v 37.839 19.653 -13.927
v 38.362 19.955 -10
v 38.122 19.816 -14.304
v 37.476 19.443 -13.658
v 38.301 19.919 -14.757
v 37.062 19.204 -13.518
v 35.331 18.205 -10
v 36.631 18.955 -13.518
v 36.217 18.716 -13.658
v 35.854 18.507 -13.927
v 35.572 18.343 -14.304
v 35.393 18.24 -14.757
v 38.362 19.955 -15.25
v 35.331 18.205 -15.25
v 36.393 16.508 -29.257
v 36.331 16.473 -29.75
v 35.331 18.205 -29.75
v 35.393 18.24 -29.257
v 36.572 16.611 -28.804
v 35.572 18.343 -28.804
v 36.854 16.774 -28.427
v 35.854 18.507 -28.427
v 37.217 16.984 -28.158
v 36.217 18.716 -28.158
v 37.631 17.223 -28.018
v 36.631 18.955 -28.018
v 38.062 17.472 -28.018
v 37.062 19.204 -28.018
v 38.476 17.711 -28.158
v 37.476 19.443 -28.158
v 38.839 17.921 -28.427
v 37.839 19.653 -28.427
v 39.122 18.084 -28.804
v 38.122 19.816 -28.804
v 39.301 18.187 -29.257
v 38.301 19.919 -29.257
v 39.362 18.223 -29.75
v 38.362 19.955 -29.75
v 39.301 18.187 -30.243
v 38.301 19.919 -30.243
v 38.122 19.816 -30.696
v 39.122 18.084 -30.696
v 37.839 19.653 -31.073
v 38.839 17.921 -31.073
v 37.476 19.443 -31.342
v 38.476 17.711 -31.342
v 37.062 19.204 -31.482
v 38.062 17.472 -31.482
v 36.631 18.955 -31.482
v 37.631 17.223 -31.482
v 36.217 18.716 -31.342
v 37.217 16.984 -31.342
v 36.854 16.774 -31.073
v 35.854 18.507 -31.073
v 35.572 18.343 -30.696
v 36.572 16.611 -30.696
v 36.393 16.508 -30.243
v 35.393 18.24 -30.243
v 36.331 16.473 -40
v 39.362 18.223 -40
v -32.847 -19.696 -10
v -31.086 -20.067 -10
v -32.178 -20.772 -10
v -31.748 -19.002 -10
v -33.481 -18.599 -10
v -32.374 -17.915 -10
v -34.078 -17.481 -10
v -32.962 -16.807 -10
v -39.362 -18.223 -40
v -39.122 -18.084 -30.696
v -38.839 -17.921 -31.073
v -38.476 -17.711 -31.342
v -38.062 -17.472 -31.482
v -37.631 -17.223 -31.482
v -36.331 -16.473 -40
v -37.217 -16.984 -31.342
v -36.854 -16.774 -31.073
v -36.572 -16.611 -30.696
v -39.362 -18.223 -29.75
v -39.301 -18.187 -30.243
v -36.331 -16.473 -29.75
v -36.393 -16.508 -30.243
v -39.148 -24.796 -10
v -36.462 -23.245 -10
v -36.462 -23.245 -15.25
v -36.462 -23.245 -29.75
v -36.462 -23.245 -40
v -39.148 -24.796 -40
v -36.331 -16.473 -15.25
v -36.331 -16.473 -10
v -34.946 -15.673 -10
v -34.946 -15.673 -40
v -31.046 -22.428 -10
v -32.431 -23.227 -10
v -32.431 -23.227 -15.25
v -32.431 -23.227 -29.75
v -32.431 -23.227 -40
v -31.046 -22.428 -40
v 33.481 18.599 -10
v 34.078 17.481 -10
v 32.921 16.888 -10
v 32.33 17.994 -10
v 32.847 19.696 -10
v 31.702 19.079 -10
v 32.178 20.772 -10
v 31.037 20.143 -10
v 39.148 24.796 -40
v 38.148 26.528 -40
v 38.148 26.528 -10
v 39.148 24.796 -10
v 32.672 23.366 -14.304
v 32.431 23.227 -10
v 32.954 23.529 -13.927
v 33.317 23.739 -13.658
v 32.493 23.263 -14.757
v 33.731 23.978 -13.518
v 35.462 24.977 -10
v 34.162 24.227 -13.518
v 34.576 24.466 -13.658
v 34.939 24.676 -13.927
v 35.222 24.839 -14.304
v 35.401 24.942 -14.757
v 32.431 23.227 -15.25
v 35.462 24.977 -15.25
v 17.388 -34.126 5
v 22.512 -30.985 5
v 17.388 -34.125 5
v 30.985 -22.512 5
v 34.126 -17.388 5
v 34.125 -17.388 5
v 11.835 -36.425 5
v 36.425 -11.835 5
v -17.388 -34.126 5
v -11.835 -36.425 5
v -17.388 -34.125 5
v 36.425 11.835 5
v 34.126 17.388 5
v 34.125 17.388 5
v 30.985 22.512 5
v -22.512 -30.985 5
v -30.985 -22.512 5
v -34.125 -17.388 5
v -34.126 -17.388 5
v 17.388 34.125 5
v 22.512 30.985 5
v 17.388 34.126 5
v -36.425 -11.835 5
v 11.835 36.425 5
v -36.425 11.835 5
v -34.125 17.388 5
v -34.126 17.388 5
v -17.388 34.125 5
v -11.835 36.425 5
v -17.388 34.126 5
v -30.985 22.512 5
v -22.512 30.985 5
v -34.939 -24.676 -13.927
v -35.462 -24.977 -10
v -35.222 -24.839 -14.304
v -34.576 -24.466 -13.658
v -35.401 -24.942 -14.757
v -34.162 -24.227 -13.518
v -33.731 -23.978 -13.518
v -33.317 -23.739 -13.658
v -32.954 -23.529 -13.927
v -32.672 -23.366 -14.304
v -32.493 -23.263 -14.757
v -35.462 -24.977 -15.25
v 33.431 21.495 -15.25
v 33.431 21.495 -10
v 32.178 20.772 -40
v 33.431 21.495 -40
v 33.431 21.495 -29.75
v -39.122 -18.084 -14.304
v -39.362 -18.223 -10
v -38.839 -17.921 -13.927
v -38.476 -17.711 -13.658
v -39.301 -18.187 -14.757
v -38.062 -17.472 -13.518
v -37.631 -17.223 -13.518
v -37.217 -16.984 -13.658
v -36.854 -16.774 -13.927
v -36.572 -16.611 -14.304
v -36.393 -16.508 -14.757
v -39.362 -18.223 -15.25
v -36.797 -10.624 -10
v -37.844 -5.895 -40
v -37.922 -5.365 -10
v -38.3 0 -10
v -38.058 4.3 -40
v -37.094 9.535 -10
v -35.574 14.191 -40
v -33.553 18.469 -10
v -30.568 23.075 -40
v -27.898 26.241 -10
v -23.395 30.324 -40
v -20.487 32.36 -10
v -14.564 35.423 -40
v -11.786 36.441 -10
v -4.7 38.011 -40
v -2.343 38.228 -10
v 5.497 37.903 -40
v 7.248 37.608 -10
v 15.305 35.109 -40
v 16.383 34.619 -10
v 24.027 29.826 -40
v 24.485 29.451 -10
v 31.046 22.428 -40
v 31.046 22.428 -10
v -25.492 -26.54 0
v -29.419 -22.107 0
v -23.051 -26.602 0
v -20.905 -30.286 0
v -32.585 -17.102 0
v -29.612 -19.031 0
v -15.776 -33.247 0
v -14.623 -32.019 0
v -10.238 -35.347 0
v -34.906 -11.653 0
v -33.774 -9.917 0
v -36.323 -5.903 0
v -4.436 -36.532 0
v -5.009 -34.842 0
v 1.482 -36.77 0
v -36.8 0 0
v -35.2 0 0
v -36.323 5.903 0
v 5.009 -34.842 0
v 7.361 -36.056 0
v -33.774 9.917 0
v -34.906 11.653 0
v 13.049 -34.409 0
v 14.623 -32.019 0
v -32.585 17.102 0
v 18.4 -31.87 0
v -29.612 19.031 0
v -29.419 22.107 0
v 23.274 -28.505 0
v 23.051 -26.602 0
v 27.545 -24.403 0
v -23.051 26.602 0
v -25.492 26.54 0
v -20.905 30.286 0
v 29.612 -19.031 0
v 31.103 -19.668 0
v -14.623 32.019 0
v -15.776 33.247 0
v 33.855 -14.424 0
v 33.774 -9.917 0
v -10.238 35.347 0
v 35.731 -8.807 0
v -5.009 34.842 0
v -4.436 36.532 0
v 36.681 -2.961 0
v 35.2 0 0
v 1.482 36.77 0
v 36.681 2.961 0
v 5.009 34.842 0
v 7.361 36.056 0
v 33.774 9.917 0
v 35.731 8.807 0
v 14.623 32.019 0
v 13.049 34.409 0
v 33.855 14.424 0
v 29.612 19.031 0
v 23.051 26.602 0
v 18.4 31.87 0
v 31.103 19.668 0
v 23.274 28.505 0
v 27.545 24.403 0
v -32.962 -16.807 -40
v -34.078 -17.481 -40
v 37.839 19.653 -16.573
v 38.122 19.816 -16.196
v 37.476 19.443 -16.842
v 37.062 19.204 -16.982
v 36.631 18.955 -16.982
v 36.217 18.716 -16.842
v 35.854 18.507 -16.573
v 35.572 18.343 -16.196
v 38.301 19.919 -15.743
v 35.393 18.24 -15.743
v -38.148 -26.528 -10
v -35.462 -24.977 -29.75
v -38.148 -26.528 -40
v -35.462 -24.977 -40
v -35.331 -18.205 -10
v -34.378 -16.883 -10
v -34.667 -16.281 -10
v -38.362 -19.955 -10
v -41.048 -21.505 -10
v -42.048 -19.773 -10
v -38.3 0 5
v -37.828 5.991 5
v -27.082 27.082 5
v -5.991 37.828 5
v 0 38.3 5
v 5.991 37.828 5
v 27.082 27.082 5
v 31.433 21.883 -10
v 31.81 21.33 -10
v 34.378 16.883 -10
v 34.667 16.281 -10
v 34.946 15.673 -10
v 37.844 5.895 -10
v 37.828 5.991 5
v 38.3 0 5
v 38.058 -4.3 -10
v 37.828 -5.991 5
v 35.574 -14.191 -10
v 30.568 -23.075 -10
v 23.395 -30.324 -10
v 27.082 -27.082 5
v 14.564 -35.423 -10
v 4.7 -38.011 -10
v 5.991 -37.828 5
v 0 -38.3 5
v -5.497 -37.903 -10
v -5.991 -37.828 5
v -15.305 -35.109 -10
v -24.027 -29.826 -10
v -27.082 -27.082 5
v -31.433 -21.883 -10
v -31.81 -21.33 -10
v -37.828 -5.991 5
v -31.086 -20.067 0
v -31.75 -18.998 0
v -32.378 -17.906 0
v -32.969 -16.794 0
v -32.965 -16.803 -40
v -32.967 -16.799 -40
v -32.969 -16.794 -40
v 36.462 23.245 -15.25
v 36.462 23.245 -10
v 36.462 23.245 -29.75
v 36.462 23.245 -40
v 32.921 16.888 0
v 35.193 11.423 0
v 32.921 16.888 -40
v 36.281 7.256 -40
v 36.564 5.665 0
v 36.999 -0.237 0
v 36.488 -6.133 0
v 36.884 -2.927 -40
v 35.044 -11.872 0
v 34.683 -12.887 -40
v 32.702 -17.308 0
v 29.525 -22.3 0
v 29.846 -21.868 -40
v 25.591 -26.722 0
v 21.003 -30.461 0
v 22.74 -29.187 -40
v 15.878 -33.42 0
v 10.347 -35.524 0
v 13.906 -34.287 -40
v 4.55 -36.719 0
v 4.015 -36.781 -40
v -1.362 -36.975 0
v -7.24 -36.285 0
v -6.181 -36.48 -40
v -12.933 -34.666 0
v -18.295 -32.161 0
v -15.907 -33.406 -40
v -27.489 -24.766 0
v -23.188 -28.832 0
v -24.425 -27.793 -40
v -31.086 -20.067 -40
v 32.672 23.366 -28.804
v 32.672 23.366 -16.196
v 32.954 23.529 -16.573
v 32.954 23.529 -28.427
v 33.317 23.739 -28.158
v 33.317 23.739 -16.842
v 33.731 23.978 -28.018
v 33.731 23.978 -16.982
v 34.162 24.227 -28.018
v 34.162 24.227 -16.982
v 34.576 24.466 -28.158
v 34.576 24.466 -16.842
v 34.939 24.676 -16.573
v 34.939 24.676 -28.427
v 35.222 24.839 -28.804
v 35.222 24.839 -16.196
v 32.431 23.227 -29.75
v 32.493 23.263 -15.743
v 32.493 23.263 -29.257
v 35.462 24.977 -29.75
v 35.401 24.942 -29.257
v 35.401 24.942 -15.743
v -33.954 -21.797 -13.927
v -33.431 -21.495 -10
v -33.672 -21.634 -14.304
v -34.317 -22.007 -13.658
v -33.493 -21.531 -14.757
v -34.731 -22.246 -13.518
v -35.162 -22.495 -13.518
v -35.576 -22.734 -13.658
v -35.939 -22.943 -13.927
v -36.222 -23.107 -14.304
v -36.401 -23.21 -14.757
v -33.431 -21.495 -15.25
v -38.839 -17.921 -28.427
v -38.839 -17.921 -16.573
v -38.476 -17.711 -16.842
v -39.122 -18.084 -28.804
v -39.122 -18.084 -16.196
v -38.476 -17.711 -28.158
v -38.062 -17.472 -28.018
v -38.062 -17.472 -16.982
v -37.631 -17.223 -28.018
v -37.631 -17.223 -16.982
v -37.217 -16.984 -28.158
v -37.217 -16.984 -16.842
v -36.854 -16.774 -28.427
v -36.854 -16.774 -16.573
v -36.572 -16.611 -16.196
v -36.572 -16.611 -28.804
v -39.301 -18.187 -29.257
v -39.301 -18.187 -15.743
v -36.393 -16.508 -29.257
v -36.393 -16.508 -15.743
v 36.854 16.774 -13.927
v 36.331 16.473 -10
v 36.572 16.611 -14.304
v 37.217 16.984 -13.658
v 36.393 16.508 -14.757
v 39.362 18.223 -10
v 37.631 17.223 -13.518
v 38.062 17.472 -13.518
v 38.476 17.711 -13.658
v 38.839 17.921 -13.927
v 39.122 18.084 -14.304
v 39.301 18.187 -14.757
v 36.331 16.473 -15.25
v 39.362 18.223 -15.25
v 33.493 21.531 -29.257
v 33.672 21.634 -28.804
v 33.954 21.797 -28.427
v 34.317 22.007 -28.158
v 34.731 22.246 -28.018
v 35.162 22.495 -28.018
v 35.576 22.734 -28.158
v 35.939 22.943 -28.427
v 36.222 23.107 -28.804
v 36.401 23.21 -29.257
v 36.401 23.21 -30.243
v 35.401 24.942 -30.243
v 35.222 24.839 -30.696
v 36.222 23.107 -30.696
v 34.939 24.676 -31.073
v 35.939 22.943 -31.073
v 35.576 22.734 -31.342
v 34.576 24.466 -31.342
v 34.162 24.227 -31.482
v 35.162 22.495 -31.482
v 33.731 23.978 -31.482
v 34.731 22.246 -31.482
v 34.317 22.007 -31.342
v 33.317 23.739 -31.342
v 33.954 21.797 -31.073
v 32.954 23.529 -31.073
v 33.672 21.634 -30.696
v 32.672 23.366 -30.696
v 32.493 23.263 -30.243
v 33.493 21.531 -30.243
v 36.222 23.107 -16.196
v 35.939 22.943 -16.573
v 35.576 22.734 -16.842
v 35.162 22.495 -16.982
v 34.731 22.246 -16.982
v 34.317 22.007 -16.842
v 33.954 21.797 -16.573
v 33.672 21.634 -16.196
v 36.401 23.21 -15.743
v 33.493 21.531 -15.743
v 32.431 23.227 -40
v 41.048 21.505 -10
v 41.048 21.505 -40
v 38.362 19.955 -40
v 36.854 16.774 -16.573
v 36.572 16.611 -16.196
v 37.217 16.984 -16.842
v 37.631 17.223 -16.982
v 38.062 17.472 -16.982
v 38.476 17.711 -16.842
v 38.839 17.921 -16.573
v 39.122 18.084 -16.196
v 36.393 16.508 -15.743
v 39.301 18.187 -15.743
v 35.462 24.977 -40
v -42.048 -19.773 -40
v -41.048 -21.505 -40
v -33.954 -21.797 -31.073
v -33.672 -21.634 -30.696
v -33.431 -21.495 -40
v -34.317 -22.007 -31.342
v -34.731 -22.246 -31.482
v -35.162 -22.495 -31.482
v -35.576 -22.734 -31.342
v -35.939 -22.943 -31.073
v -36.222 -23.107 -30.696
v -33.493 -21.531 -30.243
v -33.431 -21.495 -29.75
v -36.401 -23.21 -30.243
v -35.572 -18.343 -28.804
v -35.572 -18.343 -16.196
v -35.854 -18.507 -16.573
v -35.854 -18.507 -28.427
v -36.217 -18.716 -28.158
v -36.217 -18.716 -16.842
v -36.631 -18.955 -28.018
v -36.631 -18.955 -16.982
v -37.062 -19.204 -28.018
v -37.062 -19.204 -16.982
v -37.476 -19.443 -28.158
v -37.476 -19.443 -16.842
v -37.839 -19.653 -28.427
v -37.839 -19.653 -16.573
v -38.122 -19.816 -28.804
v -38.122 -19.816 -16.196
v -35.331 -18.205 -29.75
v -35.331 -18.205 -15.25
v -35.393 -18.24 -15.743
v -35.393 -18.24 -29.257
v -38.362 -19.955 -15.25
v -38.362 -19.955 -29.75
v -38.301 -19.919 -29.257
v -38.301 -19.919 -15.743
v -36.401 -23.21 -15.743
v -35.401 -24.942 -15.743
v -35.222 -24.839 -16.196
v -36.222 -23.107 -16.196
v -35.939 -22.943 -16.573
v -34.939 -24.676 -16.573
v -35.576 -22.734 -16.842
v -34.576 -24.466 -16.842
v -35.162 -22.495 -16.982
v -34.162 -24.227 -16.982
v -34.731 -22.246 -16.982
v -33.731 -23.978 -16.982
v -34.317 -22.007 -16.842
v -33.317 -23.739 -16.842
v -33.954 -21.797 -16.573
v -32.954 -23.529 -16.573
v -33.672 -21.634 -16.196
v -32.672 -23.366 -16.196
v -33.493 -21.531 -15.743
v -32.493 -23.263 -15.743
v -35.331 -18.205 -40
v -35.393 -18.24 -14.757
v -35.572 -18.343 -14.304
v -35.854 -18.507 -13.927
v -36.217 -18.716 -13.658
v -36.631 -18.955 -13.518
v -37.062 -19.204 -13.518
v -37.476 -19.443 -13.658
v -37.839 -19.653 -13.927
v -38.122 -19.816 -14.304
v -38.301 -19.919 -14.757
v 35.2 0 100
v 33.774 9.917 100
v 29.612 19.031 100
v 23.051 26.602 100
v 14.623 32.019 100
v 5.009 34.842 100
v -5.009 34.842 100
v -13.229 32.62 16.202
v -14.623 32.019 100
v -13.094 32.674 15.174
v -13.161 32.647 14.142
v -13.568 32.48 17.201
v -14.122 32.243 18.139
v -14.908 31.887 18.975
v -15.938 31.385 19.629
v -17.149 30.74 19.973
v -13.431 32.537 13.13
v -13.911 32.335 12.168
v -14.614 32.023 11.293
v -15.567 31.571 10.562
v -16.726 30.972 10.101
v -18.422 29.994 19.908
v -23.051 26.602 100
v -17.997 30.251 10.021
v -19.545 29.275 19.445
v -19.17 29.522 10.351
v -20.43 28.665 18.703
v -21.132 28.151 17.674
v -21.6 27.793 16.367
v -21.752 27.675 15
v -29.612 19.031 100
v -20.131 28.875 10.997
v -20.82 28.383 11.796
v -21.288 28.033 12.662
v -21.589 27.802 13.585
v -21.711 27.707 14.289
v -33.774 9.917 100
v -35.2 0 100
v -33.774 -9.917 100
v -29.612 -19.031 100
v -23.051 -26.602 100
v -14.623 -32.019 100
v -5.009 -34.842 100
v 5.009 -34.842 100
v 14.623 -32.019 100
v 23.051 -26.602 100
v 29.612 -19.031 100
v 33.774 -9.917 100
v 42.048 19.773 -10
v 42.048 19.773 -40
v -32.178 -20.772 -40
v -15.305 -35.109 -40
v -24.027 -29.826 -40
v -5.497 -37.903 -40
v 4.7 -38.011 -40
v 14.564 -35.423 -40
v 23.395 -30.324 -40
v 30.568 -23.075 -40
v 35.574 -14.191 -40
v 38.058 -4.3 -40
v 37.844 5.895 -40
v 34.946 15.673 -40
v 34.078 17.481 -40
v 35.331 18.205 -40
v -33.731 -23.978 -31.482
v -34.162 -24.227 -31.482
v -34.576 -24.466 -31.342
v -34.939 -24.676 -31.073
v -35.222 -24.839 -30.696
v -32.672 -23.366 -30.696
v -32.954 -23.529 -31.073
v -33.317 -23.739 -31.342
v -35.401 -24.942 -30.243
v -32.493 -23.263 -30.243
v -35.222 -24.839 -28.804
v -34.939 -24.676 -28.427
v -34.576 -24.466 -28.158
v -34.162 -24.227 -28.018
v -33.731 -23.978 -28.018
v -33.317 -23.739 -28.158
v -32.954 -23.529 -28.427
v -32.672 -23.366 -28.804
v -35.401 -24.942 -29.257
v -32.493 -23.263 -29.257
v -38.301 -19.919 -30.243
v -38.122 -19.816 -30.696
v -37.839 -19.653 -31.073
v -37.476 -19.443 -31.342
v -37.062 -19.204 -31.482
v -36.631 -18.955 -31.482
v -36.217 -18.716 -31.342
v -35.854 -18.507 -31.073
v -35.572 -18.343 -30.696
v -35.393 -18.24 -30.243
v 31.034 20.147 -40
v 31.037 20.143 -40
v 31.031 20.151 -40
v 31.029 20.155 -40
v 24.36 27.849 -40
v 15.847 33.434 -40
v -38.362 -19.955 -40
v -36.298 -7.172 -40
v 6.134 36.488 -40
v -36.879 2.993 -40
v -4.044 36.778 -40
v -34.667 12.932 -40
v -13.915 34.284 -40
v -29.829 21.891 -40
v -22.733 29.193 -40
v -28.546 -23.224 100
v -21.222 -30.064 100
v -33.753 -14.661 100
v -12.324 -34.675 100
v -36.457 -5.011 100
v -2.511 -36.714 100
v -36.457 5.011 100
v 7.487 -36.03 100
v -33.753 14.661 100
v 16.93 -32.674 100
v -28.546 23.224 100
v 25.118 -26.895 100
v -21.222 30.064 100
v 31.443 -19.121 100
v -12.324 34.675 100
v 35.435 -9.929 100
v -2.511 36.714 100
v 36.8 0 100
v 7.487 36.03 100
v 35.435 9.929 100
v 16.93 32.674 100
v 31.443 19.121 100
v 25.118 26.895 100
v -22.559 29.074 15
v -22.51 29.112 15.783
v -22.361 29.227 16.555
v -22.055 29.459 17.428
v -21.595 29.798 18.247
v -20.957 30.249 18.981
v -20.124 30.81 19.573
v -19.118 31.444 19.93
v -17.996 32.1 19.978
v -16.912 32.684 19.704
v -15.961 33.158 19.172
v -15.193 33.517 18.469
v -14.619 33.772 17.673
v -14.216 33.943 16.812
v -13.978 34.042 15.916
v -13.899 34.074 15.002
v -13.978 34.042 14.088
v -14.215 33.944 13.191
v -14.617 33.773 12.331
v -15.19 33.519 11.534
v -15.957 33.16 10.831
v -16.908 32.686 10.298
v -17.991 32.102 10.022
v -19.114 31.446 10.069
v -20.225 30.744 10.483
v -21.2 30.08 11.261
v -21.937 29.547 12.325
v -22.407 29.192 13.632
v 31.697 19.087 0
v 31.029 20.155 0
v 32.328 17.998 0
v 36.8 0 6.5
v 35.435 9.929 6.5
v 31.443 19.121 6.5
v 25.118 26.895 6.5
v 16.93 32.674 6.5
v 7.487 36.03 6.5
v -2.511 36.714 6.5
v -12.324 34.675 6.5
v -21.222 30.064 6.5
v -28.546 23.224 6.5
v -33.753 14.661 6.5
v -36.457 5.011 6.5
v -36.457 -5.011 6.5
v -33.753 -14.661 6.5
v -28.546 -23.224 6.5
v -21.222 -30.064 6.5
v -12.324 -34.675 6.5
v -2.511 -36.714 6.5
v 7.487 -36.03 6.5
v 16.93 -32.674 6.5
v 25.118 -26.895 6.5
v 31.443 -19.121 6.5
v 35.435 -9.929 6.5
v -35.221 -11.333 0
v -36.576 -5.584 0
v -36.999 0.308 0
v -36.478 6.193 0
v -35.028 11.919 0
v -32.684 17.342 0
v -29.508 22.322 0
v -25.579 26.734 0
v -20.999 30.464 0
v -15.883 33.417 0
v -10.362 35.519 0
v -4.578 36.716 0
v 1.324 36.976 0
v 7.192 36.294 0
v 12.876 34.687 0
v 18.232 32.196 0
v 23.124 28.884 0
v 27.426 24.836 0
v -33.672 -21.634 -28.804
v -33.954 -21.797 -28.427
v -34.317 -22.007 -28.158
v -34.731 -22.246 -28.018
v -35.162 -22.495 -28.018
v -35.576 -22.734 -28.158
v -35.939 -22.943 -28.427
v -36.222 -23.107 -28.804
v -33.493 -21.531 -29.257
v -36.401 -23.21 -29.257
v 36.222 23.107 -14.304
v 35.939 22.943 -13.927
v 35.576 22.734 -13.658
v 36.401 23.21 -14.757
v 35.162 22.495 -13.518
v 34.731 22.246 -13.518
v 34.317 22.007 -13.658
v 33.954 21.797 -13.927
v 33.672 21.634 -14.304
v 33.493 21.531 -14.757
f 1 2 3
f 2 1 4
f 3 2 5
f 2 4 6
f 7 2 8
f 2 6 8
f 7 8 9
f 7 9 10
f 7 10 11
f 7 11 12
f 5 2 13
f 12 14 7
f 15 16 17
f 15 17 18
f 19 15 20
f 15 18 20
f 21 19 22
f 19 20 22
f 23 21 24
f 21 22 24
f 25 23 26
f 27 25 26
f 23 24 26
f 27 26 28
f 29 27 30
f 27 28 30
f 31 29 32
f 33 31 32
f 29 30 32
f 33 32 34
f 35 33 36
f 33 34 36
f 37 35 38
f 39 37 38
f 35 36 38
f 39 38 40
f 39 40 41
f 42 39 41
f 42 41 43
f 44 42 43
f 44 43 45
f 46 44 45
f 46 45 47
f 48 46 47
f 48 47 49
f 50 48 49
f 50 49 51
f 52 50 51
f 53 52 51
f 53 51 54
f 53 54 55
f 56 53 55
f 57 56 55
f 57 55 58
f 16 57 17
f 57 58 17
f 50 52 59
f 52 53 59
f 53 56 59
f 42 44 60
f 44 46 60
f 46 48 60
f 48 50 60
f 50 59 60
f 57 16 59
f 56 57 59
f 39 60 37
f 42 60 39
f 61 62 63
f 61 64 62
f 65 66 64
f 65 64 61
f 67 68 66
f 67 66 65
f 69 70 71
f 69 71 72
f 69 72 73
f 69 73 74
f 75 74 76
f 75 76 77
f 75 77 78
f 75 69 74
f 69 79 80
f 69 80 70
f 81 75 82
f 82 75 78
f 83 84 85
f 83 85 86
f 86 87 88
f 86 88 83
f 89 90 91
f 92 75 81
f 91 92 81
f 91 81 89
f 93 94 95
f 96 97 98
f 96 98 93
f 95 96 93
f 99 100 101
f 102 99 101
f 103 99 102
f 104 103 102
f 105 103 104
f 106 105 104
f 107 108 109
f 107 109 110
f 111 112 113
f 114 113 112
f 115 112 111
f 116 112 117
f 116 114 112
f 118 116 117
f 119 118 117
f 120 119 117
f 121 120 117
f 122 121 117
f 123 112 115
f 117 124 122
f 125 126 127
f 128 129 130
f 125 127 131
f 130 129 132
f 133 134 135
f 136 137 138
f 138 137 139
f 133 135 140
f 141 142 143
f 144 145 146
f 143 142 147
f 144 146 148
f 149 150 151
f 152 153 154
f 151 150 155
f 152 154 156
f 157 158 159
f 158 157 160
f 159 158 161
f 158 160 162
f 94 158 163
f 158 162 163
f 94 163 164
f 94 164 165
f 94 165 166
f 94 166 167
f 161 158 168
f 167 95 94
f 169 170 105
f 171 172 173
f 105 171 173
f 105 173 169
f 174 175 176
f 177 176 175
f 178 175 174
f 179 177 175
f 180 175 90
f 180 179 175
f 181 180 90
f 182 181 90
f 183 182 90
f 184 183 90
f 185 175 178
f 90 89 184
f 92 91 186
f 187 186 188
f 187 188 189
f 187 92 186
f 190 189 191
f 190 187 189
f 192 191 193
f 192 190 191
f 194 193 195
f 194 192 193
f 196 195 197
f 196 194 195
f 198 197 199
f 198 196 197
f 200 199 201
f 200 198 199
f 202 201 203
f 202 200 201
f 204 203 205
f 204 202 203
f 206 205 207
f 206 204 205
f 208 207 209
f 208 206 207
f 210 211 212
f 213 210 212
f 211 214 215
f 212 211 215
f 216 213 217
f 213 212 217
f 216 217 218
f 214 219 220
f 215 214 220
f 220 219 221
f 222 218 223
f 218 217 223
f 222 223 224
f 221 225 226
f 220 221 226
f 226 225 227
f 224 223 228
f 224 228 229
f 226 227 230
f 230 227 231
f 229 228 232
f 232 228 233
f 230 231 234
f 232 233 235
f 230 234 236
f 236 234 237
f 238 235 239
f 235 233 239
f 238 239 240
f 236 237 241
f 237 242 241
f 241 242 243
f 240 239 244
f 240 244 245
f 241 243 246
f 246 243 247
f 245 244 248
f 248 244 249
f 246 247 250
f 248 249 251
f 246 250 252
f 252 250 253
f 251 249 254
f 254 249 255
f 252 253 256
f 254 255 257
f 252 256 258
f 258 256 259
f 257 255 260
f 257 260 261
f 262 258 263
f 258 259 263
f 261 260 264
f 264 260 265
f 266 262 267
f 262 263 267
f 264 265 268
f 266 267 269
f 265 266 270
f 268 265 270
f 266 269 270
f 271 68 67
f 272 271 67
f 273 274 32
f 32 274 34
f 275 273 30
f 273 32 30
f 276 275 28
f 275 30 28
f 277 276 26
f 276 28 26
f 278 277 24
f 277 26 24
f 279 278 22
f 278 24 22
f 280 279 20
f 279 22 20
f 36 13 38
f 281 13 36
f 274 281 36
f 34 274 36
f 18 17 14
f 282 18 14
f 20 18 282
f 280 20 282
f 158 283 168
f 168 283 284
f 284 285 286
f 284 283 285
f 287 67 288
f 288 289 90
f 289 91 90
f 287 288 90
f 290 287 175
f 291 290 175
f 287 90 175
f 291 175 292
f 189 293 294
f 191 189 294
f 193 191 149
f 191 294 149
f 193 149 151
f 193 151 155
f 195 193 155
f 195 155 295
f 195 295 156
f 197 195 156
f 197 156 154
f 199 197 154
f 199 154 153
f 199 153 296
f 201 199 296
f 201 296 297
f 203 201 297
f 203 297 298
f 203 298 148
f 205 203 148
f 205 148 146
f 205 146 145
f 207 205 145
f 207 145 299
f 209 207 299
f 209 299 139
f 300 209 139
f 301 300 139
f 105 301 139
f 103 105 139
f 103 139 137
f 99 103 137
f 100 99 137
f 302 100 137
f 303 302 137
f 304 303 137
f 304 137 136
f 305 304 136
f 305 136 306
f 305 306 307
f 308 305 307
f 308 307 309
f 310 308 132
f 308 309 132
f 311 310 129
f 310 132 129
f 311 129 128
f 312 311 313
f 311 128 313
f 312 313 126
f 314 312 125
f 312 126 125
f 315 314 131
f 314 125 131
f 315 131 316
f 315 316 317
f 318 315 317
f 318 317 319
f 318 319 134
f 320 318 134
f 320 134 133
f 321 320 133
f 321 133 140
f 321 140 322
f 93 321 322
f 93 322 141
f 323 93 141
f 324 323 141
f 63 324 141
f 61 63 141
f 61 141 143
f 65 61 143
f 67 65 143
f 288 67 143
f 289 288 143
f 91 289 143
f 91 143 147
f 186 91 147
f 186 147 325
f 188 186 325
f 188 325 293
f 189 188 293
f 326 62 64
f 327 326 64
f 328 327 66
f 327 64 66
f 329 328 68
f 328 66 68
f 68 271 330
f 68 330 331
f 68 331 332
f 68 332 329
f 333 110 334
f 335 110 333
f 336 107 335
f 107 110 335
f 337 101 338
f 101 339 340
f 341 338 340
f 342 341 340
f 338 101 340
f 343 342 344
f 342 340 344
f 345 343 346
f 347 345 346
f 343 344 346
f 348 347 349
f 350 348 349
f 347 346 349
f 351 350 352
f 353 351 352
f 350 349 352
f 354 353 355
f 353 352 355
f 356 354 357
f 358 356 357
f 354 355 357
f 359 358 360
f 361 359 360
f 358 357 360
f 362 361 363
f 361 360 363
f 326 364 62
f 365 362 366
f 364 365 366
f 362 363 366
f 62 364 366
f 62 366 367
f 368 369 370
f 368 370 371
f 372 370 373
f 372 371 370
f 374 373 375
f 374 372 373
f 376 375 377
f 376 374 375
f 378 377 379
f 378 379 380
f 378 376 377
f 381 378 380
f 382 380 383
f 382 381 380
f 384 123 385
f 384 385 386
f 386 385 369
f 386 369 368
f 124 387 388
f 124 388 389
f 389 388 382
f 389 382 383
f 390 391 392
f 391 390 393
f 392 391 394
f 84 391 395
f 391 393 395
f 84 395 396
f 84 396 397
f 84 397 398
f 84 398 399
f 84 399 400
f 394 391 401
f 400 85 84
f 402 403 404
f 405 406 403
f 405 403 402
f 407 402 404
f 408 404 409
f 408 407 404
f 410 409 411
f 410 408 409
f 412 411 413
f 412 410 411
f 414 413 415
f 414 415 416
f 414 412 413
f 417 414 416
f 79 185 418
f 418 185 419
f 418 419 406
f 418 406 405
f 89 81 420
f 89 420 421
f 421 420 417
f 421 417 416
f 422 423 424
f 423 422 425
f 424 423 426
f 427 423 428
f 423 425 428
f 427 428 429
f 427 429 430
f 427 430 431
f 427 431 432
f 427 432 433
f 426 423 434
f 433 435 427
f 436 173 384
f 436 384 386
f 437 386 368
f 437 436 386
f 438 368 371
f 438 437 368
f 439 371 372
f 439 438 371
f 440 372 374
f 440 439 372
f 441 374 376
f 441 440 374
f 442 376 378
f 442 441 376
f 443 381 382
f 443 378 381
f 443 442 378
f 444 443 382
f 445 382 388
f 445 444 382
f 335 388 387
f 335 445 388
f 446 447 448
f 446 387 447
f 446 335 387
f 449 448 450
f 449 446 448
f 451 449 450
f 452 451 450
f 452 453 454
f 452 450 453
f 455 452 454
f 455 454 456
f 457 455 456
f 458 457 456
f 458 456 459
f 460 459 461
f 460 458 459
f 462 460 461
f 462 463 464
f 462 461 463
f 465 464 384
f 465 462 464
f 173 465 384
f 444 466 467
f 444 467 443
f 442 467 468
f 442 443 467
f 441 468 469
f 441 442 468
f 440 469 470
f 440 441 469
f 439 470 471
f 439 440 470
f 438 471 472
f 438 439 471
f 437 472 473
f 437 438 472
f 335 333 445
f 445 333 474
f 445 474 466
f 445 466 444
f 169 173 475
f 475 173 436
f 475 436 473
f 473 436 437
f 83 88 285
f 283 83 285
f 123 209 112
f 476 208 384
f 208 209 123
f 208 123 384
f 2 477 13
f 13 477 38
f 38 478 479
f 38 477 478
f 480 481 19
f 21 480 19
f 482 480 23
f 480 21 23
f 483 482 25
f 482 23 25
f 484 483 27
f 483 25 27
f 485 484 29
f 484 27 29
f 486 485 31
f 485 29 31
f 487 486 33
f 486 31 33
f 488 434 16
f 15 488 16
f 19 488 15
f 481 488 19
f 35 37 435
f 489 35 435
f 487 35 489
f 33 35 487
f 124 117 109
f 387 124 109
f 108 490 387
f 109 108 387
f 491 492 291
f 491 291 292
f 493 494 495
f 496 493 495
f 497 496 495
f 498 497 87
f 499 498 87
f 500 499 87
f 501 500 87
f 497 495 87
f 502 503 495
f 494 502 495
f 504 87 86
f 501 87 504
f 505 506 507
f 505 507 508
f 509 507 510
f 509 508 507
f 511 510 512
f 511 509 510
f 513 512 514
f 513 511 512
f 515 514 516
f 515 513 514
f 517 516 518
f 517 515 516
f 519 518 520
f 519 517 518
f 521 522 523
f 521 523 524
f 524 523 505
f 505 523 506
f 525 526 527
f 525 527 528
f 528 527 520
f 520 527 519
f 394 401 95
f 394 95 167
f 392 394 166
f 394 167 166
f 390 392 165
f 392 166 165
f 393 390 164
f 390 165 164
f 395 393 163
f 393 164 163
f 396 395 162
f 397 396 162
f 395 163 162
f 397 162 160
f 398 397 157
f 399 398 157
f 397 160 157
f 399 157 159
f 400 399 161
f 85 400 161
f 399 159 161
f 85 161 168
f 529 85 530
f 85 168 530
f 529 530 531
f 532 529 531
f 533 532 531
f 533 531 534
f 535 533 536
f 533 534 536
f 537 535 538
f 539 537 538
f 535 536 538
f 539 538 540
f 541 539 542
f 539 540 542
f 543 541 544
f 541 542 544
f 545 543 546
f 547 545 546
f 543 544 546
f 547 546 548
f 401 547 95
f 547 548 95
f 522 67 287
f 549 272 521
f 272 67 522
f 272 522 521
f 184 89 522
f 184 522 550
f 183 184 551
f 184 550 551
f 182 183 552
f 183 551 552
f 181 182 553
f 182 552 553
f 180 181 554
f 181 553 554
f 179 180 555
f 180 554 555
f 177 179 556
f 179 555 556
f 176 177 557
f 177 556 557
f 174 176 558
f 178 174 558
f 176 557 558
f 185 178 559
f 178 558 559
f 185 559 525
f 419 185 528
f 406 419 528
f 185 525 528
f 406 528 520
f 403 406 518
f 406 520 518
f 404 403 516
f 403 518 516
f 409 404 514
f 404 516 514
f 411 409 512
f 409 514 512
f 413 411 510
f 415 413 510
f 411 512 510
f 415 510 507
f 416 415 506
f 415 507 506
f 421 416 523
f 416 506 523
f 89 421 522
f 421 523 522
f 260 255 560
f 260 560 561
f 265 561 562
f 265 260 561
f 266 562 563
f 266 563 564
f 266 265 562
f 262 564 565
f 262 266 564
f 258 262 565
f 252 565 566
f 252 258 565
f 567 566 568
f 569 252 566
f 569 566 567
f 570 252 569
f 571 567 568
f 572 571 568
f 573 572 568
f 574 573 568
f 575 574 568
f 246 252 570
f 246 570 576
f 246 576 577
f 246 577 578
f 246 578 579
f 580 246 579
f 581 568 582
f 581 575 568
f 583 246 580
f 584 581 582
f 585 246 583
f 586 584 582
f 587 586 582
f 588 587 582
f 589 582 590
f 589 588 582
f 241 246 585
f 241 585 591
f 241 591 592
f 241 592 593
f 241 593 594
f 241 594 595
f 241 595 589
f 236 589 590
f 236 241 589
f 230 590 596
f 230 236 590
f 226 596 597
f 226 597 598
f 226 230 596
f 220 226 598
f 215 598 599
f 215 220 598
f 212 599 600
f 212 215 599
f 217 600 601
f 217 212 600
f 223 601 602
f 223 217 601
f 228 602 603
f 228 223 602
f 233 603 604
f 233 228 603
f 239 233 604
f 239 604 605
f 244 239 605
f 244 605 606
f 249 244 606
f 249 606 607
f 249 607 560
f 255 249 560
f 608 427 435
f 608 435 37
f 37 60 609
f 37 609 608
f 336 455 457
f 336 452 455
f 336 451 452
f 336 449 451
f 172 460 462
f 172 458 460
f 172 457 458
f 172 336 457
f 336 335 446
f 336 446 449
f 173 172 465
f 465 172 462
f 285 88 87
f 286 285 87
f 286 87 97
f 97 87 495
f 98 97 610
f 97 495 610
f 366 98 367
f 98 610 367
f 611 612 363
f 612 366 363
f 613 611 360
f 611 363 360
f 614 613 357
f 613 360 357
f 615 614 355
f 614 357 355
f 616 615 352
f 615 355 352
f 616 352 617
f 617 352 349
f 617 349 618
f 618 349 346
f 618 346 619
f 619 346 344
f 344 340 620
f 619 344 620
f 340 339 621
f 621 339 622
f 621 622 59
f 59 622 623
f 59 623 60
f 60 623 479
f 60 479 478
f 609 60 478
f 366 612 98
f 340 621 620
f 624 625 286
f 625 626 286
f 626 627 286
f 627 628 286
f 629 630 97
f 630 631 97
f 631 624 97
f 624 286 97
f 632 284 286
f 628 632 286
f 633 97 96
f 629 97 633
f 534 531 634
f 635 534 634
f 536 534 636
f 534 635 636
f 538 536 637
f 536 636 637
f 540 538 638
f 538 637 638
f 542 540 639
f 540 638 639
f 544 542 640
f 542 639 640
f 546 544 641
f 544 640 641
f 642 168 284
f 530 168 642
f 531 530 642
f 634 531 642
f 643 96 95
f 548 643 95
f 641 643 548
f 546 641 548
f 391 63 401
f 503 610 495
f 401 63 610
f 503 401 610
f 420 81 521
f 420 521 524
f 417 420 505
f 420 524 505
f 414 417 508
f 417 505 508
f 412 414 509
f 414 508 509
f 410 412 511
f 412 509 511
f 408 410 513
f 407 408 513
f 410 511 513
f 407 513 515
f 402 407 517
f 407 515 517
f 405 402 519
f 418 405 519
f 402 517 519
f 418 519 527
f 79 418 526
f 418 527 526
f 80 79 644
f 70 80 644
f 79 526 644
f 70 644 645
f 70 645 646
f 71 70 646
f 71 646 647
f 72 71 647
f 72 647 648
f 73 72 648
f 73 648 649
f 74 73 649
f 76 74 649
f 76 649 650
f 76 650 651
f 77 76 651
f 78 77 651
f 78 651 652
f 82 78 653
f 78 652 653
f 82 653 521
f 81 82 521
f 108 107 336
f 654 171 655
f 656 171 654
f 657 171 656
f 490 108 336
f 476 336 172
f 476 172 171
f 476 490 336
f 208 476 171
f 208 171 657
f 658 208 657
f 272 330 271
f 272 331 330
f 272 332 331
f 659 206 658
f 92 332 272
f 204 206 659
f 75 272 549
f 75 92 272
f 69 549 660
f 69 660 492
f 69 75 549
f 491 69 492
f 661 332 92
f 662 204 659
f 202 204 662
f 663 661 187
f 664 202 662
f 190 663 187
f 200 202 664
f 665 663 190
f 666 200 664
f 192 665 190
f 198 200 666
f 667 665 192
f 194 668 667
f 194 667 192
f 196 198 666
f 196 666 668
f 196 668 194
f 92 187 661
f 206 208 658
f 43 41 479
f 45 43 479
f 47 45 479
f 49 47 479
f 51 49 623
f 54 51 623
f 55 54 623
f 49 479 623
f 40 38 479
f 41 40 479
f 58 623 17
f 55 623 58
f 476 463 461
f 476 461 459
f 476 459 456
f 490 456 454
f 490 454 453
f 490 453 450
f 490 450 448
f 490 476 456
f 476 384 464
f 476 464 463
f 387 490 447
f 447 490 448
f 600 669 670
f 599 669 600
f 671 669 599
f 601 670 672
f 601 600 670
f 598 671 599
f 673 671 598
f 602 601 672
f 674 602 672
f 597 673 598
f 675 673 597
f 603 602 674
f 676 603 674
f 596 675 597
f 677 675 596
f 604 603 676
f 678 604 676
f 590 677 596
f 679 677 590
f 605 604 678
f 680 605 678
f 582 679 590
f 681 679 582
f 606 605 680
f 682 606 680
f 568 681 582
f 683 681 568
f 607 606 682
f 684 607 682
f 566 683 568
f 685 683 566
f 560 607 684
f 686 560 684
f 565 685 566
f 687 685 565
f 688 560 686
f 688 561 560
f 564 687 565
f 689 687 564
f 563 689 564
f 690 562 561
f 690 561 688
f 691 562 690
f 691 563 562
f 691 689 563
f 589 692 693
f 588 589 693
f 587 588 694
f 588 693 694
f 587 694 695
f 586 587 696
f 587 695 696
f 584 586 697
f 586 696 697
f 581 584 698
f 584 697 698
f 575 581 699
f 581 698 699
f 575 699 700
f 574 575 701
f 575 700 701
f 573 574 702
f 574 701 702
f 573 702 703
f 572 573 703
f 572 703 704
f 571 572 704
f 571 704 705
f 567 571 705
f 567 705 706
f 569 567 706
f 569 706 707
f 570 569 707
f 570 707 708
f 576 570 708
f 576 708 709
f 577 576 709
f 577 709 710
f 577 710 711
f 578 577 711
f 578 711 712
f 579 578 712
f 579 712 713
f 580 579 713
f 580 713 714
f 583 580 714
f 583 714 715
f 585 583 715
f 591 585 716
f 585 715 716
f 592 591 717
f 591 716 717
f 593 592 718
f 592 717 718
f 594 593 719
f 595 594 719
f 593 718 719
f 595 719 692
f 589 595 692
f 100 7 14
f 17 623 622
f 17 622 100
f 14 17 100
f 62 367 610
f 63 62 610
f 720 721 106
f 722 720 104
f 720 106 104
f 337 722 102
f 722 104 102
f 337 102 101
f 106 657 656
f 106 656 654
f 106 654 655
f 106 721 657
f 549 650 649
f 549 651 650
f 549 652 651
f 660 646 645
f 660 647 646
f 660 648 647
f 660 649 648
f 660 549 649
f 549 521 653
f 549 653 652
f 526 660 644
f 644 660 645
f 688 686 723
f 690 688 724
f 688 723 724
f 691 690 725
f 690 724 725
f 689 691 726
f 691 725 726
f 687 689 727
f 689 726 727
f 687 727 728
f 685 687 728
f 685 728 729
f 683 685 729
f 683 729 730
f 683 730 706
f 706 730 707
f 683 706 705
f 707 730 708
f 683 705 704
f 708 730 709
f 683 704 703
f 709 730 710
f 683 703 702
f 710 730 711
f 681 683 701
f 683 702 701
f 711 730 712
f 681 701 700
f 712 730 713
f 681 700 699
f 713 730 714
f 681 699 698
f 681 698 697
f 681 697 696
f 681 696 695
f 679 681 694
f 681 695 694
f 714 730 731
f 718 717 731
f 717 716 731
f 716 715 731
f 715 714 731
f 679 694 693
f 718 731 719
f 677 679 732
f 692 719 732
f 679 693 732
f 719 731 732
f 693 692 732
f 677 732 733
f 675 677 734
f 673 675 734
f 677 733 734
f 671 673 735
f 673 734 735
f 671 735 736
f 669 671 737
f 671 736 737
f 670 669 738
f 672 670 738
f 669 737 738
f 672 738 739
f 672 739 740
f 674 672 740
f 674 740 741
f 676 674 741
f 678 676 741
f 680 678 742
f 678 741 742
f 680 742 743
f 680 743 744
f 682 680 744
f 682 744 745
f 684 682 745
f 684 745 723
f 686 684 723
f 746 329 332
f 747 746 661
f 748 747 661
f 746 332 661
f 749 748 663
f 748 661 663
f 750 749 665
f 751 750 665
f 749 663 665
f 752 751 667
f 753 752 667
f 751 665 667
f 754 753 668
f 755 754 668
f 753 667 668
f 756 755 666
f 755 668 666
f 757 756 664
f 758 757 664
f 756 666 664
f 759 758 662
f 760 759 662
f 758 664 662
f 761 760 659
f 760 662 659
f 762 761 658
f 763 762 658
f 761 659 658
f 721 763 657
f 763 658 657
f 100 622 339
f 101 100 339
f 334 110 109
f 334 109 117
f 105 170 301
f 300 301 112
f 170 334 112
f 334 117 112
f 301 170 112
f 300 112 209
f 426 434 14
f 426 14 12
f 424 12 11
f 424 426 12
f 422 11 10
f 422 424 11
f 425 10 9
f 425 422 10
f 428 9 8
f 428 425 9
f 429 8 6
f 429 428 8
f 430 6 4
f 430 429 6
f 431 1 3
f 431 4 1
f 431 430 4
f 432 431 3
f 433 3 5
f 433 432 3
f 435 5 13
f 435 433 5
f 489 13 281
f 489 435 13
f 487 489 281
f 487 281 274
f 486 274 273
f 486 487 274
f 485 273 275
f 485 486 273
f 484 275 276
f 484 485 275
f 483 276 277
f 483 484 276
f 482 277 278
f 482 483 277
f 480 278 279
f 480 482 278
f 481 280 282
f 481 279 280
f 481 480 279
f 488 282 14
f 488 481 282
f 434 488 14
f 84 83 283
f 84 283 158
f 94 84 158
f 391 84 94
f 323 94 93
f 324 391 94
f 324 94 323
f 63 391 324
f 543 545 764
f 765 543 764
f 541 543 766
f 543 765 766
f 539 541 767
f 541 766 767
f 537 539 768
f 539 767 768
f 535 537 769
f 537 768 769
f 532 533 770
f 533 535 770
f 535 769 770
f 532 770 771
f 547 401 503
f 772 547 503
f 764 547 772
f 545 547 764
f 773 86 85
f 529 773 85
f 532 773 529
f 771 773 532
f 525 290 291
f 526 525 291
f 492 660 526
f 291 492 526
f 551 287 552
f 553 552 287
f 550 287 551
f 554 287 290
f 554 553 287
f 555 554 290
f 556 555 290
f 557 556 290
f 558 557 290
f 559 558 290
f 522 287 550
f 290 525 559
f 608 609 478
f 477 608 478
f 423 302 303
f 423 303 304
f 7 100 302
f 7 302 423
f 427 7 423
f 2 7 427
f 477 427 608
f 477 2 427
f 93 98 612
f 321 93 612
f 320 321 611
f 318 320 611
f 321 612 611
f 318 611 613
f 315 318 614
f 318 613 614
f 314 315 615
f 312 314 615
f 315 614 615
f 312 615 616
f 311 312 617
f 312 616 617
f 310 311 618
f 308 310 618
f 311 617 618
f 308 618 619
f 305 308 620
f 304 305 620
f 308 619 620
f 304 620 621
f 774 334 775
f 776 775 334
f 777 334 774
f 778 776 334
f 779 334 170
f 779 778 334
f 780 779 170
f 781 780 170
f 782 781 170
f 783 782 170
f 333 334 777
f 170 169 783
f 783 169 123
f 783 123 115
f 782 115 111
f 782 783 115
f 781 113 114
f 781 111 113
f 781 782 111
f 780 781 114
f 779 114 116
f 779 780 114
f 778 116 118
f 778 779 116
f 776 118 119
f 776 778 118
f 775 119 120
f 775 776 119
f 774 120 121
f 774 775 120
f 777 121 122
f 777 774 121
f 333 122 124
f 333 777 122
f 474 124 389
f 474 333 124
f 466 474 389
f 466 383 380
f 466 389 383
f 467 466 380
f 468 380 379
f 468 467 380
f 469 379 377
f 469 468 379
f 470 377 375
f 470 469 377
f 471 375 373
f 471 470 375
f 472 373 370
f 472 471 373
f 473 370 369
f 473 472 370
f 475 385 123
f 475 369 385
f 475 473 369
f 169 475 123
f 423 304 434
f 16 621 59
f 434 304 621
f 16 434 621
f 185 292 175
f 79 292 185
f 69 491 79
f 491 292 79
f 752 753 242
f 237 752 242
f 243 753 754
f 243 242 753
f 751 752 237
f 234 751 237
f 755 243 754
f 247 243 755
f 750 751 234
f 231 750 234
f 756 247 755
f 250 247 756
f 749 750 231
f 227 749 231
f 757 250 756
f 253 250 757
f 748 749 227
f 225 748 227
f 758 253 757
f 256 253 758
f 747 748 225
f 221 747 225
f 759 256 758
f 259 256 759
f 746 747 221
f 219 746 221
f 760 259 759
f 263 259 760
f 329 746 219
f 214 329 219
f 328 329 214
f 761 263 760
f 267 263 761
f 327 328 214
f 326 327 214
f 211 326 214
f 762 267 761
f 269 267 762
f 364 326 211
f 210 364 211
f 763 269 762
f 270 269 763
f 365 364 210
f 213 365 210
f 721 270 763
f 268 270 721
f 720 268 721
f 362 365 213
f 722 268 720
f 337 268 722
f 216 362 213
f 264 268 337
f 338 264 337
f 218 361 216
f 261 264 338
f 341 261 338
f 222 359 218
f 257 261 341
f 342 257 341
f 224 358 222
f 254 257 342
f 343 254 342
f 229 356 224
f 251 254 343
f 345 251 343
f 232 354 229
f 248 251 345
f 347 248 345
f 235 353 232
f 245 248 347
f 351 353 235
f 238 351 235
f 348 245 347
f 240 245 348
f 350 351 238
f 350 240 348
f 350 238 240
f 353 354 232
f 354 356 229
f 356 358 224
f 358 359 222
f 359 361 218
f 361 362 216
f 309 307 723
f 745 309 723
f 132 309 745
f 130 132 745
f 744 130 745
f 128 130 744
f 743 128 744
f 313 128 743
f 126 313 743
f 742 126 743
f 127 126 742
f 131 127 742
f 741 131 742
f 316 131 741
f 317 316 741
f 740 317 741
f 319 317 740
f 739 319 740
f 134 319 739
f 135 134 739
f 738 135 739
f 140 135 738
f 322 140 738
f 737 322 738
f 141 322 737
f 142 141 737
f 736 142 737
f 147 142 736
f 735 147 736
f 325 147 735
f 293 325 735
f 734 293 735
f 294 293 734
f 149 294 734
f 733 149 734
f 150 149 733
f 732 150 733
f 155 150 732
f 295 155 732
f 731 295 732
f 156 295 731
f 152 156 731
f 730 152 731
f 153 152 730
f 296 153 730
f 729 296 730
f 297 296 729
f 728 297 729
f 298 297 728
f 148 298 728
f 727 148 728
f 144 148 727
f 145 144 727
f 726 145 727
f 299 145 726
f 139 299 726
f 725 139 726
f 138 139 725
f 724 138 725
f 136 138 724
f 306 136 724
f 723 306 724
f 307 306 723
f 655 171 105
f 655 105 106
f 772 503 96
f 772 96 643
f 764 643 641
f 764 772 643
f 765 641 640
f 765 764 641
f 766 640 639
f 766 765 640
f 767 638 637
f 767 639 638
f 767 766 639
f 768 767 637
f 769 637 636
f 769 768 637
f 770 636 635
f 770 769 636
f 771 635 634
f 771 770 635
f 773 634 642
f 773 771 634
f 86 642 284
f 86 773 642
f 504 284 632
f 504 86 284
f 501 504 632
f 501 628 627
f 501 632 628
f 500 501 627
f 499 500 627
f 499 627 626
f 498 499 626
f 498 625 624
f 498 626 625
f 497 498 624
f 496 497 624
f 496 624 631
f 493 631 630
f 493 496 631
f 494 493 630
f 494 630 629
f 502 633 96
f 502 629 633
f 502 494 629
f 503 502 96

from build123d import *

# Parameters (mm, degrees)
SKETCH1_R                = 36.8
SKETCH1_R_2              = 35.2
BOSS_EXTRUDE1_DEPTH      = 100
BOSS_EXTRUDE2_DEPTH      = 10
BOSS_EXTRUDE2_DEPTH_BACK = 5
SKETCH2_R                = 38.3
SKETCH2_R_2              = 36.8
CHAMFER1_SIZE            = 1.5
BOSS_EXTRUDE3_START      = 30
BOSS_EXTRUDE3_DEPTH      = 30
SKETCH7_R                = 1.75
CUT_EXTRUDE1_DEPTH       = 116.043019012
CUT_EXTRUDE2_REACH       = 153.112
CUT_EXTRUDE3_REACH       = 138.3
CUT_EXTRUDE3_END_RADIUS  = 35.2
SKETCH9_R                = 5


with BuildPart() as part:
    # Sketch1 → Boss-Extrude1 (new body)
    with BuildSketch(Plane.XY):
        Circle(SKETCH1_R)
        Circle(SKETCH1_R_2, mode=Mode.SUBTRACT)
    extrude(amount=BOSS_EXTRUDE1_DEPTH)

    # Sketch2 → Boss-Extrude2 (add, two sides: drawn at the far end of the back side and taken through both)
    with BuildSketch(Plane(origin=(0, 0, 0), x_dir=(-1, 0, 0), z_dir=(0, 0, -1)).offset(-BOSS_EXTRUDE2_DEPTH_BACK)):
        Circle(SKETCH2_R)
        Circle(SKETCH2_R_2, mode=Mode.SUBTRACT)
    extrude(amount=BOSS_EXTRUDE2_DEPTH + BOSS_EXTRUDE2_DEPTH_BACK)

    # Chamfer1
    chamfer1_edges = [part.edges().sort_by_distance(p)[0] for p in [
        (-36.8, 0, 5),
    ]]
    chamfer(chamfer1_edges, length=CHAMFER1_SIZE - 0.0001)  # a hair under: the kernel refuses the full size

    # Sketch6 → Boss-Extrude3 (add)
    with BuildSketch(Plane(origin=(0, 0, -10), x_dir=(-1, 0, 0), z_dir=(0, 0, -1)).offset(BOSS_EXTRUDE3_START)):
        with BuildLine():
            Line((-31.046363436, 22.427958387), (-32.43120853, 23.227499075))
            Line((-32.43120853, 23.227499075), (-35.462297443, 24.977499075))
            Line((-35.462297443, 24.977499075), (-38.147666087, 26.527897384))
            Line((-38.147666087, 26.527897384), (-39.147666087, 24.795846576))
            Line((-39.147666087, 24.795846576), (-36.462297443, 23.245448267))
            Line((-36.462297443, 23.245448267), (-33.43120853, 21.495448267))
            Line((-33.43120853, 21.495448267), (-32.177933832, 20.771869783))
            Line((-32.177933832, 20.771869783), (-30.861043972, 20.045846576))
            ThreePointArc((-30.861043972, 20.045846576), (18.4, 31.869734859), (32.790734361, -16.703524779))
            Line((32.790734361, -16.703524779), (34.077933832, -17.480973249))
            Line((34.077933832, -17.480973249), (35.33120853, -18.204551733))
            Line((35.33120853, -18.204551733), (38.362297443, -19.954551733))
            Line((38.362297443, -19.954551733), (41.047666087, -21.504950042))
            Line((41.047666087, -21.504950042), (42.047666087, -19.772899234))
            Line((42.047666087, -19.772899234), (39.362297443, -18.222500925))
            Line((39.362297443, -18.222500925), (36.33120853, -16.472500925))
            Line((36.33120853, -16.472500925), (34.946363436, -15.672960237))
            ThreePointArc((34.946363436, -15.672960237), (19.15, 33.168772965), (-31.046363436, 22.427958387))
        make_face()
        with BuildLine():
            Line((-34.946363436, 15.672960237), (-36.33120853, 16.472500925))
            Line((-36.33120853, 16.472500925), (-39.362297443, 18.222500925))
            Line((-39.362297443, 18.222500925), (-42.047666087, 19.772899234))
            Line((-42.047666087, 19.772899234), (-41.047666087, 21.504950042))
            Line((-41.047666087, 21.504950042), (-38.362297443, 19.954551733))
            Line((-38.362297443, 19.954551733), (-35.33120853, 18.204551733))
            Line((-35.33120853, 18.204551733), (-34.077933832, 17.480973249))
            Line((-34.077933832, 17.480973249), (-32.743288904, 16.796339832))
            ThreePointArc((-32.743288904, 16.796339832), (-18.4, -31.869734859), (30.917701437, -19.958350079))
            Line((30.917701437, -19.958350079), (32.177933832, -20.771869783))
            Line((32.177933832, -20.771869783), (33.43120853, -21.495448267))
            Line((33.43120853, -21.495448267), (36.462297443, -23.245448267))
            Line((36.462297443, -23.245448267), (39.147666087, -24.795846576))
            Line((39.147666087, -24.795846576), (38.147666087, -26.527897384))
            Line((38.147666087, -26.527897384), (35.462297443, -24.977499075))
            Line((35.462297443, -24.977499075), (32.43120853, -23.227499075))
            Line((32.43120853, -23.227499075), (31.046363436, -22.427958387))
            ThreePointArc((31.046363436, -22.427958387), (-19.15, -33.168772965), (-34.946363436, 15.672960237))
        make_face()
    extrude(amount=-BOSS_EXTRUDE3_DEPTH)

    # Sketch7 → Cut-Extrude1 (cut, symmetric)
    with BuildSketch(Plane(origin=(0, 0, 0), x_dir=(0, 0, 1), z_dir=(0.500000000000001, -0.866025403784438, 0))):
        with Locations(Location((-29.75, 41.45, 0), (0, 0, 270))):
            Circle(SKETCH7_R)
        with Locations(Location((-15.25, 41.45, 0), (0, 0, 270))):
            Circle(SKETCH7_R)
    cut_extrude1 = extrude(amount=CUT_EXTRUDE1_DEPTH, both=True, mode=Mode.SUBTRACT)

    # Mirror1: Cut-Extrude1 across plane
    add(cut_extrude1.mirror(Plane(origin=(0, 0, 0), x_dir=(0, 0, 1), z_dir=(0.866025403784438, 0.500000000000001, 0))), mode=Mode.SUBTRACT)

    # Cut-Extrude2: up to this face of the body (flat: up to its plane)
    cut_extrude2_end = Plane(part.part.faces().sort_by_distance((35.759138818, 0, 0))[0])
    # Sketch8 → Cut-Extrude2 (cut, up to the picked face)
    with BuildSketch(Plane(origin=(0, 0, -40), x_dir=(-1, 0, 0), z_dir=(0, 0, -1)), mode=Mode.PRIVATE) as cut_extrude2_sk1:
        with BuildLine():
            ThreePointArc((31.085732423, -20.066819373), (32.069109105, -18.454599459), (32.968944874, -16.794304805))
            ThreePointArc((32.968944874, -16.794304805), (18.5, 32.04293994), (-31.028767037, 20.154791395))
            ThreePointArc((-31.028767037, 20.154791395), (-32.016706501, 18.545363432), (-32.921241561, 16.887624287))
            ThreePointArc((-32.921241561, 16.887624287), (-18.5, -32.04293994), (31.085732423, -20.066819373))
        make_face()
    cut_extrude2_tool1 = split(extrude(cut_extrude2_sk1.sketch, amount=-CUT_EXTRUDE2_REACH, mode=Mode.PRIVATE), bisect_by=cut_extrude2_end, keep=Keep.BOTH, mode=Mode.PRIVATE)
    add(cut_extrude2_tool1.solids().sort_by(Axis((0, 0, -40), (0, 0, 1)))[0], mode=Mode.SUBTRACT)

    # Cut-Extrude3: up to this cylinder (the profile starts outside it)
    cut_extrude3_end = Plane(origin=(0, 0, 15), z_dir=(0, 0, -1)) * Cylinder(CUT_EXTRUDE3_END_RADIUS, 348, mode=Mode.PRIVATE)
    # Sketch9 → Cut-Extrude3 (cut, up to the surface)
    with BuildSketch(Plane(origin=(-18.4, 31.869734859, 0), x_dir=(0.8660254037844382, 0.500000000000001, 0), z_dir=(-0.500000000000001, 0.8660254037844382, 0)), mode=Mode.PRIVATE) as cut_extrude3_sk1:
        with Locations(Location((0, -15, 0), (0, 0, 180))):
            Circle(SKETCH9_R)
    cut_extrude3_tool1 = extrude(cut_extrude3_sk1.sketch, amount=-CUT_EXTRUDE3_REACH, mode=Mode.PRIVATE) - cut_extrude3_end
    add(cut_extrude3_tool1.solids().sort_by_distance((-18.4, 31.869735, 15))[0], mode=Mode.SUBTRACT)


solid = part.part
